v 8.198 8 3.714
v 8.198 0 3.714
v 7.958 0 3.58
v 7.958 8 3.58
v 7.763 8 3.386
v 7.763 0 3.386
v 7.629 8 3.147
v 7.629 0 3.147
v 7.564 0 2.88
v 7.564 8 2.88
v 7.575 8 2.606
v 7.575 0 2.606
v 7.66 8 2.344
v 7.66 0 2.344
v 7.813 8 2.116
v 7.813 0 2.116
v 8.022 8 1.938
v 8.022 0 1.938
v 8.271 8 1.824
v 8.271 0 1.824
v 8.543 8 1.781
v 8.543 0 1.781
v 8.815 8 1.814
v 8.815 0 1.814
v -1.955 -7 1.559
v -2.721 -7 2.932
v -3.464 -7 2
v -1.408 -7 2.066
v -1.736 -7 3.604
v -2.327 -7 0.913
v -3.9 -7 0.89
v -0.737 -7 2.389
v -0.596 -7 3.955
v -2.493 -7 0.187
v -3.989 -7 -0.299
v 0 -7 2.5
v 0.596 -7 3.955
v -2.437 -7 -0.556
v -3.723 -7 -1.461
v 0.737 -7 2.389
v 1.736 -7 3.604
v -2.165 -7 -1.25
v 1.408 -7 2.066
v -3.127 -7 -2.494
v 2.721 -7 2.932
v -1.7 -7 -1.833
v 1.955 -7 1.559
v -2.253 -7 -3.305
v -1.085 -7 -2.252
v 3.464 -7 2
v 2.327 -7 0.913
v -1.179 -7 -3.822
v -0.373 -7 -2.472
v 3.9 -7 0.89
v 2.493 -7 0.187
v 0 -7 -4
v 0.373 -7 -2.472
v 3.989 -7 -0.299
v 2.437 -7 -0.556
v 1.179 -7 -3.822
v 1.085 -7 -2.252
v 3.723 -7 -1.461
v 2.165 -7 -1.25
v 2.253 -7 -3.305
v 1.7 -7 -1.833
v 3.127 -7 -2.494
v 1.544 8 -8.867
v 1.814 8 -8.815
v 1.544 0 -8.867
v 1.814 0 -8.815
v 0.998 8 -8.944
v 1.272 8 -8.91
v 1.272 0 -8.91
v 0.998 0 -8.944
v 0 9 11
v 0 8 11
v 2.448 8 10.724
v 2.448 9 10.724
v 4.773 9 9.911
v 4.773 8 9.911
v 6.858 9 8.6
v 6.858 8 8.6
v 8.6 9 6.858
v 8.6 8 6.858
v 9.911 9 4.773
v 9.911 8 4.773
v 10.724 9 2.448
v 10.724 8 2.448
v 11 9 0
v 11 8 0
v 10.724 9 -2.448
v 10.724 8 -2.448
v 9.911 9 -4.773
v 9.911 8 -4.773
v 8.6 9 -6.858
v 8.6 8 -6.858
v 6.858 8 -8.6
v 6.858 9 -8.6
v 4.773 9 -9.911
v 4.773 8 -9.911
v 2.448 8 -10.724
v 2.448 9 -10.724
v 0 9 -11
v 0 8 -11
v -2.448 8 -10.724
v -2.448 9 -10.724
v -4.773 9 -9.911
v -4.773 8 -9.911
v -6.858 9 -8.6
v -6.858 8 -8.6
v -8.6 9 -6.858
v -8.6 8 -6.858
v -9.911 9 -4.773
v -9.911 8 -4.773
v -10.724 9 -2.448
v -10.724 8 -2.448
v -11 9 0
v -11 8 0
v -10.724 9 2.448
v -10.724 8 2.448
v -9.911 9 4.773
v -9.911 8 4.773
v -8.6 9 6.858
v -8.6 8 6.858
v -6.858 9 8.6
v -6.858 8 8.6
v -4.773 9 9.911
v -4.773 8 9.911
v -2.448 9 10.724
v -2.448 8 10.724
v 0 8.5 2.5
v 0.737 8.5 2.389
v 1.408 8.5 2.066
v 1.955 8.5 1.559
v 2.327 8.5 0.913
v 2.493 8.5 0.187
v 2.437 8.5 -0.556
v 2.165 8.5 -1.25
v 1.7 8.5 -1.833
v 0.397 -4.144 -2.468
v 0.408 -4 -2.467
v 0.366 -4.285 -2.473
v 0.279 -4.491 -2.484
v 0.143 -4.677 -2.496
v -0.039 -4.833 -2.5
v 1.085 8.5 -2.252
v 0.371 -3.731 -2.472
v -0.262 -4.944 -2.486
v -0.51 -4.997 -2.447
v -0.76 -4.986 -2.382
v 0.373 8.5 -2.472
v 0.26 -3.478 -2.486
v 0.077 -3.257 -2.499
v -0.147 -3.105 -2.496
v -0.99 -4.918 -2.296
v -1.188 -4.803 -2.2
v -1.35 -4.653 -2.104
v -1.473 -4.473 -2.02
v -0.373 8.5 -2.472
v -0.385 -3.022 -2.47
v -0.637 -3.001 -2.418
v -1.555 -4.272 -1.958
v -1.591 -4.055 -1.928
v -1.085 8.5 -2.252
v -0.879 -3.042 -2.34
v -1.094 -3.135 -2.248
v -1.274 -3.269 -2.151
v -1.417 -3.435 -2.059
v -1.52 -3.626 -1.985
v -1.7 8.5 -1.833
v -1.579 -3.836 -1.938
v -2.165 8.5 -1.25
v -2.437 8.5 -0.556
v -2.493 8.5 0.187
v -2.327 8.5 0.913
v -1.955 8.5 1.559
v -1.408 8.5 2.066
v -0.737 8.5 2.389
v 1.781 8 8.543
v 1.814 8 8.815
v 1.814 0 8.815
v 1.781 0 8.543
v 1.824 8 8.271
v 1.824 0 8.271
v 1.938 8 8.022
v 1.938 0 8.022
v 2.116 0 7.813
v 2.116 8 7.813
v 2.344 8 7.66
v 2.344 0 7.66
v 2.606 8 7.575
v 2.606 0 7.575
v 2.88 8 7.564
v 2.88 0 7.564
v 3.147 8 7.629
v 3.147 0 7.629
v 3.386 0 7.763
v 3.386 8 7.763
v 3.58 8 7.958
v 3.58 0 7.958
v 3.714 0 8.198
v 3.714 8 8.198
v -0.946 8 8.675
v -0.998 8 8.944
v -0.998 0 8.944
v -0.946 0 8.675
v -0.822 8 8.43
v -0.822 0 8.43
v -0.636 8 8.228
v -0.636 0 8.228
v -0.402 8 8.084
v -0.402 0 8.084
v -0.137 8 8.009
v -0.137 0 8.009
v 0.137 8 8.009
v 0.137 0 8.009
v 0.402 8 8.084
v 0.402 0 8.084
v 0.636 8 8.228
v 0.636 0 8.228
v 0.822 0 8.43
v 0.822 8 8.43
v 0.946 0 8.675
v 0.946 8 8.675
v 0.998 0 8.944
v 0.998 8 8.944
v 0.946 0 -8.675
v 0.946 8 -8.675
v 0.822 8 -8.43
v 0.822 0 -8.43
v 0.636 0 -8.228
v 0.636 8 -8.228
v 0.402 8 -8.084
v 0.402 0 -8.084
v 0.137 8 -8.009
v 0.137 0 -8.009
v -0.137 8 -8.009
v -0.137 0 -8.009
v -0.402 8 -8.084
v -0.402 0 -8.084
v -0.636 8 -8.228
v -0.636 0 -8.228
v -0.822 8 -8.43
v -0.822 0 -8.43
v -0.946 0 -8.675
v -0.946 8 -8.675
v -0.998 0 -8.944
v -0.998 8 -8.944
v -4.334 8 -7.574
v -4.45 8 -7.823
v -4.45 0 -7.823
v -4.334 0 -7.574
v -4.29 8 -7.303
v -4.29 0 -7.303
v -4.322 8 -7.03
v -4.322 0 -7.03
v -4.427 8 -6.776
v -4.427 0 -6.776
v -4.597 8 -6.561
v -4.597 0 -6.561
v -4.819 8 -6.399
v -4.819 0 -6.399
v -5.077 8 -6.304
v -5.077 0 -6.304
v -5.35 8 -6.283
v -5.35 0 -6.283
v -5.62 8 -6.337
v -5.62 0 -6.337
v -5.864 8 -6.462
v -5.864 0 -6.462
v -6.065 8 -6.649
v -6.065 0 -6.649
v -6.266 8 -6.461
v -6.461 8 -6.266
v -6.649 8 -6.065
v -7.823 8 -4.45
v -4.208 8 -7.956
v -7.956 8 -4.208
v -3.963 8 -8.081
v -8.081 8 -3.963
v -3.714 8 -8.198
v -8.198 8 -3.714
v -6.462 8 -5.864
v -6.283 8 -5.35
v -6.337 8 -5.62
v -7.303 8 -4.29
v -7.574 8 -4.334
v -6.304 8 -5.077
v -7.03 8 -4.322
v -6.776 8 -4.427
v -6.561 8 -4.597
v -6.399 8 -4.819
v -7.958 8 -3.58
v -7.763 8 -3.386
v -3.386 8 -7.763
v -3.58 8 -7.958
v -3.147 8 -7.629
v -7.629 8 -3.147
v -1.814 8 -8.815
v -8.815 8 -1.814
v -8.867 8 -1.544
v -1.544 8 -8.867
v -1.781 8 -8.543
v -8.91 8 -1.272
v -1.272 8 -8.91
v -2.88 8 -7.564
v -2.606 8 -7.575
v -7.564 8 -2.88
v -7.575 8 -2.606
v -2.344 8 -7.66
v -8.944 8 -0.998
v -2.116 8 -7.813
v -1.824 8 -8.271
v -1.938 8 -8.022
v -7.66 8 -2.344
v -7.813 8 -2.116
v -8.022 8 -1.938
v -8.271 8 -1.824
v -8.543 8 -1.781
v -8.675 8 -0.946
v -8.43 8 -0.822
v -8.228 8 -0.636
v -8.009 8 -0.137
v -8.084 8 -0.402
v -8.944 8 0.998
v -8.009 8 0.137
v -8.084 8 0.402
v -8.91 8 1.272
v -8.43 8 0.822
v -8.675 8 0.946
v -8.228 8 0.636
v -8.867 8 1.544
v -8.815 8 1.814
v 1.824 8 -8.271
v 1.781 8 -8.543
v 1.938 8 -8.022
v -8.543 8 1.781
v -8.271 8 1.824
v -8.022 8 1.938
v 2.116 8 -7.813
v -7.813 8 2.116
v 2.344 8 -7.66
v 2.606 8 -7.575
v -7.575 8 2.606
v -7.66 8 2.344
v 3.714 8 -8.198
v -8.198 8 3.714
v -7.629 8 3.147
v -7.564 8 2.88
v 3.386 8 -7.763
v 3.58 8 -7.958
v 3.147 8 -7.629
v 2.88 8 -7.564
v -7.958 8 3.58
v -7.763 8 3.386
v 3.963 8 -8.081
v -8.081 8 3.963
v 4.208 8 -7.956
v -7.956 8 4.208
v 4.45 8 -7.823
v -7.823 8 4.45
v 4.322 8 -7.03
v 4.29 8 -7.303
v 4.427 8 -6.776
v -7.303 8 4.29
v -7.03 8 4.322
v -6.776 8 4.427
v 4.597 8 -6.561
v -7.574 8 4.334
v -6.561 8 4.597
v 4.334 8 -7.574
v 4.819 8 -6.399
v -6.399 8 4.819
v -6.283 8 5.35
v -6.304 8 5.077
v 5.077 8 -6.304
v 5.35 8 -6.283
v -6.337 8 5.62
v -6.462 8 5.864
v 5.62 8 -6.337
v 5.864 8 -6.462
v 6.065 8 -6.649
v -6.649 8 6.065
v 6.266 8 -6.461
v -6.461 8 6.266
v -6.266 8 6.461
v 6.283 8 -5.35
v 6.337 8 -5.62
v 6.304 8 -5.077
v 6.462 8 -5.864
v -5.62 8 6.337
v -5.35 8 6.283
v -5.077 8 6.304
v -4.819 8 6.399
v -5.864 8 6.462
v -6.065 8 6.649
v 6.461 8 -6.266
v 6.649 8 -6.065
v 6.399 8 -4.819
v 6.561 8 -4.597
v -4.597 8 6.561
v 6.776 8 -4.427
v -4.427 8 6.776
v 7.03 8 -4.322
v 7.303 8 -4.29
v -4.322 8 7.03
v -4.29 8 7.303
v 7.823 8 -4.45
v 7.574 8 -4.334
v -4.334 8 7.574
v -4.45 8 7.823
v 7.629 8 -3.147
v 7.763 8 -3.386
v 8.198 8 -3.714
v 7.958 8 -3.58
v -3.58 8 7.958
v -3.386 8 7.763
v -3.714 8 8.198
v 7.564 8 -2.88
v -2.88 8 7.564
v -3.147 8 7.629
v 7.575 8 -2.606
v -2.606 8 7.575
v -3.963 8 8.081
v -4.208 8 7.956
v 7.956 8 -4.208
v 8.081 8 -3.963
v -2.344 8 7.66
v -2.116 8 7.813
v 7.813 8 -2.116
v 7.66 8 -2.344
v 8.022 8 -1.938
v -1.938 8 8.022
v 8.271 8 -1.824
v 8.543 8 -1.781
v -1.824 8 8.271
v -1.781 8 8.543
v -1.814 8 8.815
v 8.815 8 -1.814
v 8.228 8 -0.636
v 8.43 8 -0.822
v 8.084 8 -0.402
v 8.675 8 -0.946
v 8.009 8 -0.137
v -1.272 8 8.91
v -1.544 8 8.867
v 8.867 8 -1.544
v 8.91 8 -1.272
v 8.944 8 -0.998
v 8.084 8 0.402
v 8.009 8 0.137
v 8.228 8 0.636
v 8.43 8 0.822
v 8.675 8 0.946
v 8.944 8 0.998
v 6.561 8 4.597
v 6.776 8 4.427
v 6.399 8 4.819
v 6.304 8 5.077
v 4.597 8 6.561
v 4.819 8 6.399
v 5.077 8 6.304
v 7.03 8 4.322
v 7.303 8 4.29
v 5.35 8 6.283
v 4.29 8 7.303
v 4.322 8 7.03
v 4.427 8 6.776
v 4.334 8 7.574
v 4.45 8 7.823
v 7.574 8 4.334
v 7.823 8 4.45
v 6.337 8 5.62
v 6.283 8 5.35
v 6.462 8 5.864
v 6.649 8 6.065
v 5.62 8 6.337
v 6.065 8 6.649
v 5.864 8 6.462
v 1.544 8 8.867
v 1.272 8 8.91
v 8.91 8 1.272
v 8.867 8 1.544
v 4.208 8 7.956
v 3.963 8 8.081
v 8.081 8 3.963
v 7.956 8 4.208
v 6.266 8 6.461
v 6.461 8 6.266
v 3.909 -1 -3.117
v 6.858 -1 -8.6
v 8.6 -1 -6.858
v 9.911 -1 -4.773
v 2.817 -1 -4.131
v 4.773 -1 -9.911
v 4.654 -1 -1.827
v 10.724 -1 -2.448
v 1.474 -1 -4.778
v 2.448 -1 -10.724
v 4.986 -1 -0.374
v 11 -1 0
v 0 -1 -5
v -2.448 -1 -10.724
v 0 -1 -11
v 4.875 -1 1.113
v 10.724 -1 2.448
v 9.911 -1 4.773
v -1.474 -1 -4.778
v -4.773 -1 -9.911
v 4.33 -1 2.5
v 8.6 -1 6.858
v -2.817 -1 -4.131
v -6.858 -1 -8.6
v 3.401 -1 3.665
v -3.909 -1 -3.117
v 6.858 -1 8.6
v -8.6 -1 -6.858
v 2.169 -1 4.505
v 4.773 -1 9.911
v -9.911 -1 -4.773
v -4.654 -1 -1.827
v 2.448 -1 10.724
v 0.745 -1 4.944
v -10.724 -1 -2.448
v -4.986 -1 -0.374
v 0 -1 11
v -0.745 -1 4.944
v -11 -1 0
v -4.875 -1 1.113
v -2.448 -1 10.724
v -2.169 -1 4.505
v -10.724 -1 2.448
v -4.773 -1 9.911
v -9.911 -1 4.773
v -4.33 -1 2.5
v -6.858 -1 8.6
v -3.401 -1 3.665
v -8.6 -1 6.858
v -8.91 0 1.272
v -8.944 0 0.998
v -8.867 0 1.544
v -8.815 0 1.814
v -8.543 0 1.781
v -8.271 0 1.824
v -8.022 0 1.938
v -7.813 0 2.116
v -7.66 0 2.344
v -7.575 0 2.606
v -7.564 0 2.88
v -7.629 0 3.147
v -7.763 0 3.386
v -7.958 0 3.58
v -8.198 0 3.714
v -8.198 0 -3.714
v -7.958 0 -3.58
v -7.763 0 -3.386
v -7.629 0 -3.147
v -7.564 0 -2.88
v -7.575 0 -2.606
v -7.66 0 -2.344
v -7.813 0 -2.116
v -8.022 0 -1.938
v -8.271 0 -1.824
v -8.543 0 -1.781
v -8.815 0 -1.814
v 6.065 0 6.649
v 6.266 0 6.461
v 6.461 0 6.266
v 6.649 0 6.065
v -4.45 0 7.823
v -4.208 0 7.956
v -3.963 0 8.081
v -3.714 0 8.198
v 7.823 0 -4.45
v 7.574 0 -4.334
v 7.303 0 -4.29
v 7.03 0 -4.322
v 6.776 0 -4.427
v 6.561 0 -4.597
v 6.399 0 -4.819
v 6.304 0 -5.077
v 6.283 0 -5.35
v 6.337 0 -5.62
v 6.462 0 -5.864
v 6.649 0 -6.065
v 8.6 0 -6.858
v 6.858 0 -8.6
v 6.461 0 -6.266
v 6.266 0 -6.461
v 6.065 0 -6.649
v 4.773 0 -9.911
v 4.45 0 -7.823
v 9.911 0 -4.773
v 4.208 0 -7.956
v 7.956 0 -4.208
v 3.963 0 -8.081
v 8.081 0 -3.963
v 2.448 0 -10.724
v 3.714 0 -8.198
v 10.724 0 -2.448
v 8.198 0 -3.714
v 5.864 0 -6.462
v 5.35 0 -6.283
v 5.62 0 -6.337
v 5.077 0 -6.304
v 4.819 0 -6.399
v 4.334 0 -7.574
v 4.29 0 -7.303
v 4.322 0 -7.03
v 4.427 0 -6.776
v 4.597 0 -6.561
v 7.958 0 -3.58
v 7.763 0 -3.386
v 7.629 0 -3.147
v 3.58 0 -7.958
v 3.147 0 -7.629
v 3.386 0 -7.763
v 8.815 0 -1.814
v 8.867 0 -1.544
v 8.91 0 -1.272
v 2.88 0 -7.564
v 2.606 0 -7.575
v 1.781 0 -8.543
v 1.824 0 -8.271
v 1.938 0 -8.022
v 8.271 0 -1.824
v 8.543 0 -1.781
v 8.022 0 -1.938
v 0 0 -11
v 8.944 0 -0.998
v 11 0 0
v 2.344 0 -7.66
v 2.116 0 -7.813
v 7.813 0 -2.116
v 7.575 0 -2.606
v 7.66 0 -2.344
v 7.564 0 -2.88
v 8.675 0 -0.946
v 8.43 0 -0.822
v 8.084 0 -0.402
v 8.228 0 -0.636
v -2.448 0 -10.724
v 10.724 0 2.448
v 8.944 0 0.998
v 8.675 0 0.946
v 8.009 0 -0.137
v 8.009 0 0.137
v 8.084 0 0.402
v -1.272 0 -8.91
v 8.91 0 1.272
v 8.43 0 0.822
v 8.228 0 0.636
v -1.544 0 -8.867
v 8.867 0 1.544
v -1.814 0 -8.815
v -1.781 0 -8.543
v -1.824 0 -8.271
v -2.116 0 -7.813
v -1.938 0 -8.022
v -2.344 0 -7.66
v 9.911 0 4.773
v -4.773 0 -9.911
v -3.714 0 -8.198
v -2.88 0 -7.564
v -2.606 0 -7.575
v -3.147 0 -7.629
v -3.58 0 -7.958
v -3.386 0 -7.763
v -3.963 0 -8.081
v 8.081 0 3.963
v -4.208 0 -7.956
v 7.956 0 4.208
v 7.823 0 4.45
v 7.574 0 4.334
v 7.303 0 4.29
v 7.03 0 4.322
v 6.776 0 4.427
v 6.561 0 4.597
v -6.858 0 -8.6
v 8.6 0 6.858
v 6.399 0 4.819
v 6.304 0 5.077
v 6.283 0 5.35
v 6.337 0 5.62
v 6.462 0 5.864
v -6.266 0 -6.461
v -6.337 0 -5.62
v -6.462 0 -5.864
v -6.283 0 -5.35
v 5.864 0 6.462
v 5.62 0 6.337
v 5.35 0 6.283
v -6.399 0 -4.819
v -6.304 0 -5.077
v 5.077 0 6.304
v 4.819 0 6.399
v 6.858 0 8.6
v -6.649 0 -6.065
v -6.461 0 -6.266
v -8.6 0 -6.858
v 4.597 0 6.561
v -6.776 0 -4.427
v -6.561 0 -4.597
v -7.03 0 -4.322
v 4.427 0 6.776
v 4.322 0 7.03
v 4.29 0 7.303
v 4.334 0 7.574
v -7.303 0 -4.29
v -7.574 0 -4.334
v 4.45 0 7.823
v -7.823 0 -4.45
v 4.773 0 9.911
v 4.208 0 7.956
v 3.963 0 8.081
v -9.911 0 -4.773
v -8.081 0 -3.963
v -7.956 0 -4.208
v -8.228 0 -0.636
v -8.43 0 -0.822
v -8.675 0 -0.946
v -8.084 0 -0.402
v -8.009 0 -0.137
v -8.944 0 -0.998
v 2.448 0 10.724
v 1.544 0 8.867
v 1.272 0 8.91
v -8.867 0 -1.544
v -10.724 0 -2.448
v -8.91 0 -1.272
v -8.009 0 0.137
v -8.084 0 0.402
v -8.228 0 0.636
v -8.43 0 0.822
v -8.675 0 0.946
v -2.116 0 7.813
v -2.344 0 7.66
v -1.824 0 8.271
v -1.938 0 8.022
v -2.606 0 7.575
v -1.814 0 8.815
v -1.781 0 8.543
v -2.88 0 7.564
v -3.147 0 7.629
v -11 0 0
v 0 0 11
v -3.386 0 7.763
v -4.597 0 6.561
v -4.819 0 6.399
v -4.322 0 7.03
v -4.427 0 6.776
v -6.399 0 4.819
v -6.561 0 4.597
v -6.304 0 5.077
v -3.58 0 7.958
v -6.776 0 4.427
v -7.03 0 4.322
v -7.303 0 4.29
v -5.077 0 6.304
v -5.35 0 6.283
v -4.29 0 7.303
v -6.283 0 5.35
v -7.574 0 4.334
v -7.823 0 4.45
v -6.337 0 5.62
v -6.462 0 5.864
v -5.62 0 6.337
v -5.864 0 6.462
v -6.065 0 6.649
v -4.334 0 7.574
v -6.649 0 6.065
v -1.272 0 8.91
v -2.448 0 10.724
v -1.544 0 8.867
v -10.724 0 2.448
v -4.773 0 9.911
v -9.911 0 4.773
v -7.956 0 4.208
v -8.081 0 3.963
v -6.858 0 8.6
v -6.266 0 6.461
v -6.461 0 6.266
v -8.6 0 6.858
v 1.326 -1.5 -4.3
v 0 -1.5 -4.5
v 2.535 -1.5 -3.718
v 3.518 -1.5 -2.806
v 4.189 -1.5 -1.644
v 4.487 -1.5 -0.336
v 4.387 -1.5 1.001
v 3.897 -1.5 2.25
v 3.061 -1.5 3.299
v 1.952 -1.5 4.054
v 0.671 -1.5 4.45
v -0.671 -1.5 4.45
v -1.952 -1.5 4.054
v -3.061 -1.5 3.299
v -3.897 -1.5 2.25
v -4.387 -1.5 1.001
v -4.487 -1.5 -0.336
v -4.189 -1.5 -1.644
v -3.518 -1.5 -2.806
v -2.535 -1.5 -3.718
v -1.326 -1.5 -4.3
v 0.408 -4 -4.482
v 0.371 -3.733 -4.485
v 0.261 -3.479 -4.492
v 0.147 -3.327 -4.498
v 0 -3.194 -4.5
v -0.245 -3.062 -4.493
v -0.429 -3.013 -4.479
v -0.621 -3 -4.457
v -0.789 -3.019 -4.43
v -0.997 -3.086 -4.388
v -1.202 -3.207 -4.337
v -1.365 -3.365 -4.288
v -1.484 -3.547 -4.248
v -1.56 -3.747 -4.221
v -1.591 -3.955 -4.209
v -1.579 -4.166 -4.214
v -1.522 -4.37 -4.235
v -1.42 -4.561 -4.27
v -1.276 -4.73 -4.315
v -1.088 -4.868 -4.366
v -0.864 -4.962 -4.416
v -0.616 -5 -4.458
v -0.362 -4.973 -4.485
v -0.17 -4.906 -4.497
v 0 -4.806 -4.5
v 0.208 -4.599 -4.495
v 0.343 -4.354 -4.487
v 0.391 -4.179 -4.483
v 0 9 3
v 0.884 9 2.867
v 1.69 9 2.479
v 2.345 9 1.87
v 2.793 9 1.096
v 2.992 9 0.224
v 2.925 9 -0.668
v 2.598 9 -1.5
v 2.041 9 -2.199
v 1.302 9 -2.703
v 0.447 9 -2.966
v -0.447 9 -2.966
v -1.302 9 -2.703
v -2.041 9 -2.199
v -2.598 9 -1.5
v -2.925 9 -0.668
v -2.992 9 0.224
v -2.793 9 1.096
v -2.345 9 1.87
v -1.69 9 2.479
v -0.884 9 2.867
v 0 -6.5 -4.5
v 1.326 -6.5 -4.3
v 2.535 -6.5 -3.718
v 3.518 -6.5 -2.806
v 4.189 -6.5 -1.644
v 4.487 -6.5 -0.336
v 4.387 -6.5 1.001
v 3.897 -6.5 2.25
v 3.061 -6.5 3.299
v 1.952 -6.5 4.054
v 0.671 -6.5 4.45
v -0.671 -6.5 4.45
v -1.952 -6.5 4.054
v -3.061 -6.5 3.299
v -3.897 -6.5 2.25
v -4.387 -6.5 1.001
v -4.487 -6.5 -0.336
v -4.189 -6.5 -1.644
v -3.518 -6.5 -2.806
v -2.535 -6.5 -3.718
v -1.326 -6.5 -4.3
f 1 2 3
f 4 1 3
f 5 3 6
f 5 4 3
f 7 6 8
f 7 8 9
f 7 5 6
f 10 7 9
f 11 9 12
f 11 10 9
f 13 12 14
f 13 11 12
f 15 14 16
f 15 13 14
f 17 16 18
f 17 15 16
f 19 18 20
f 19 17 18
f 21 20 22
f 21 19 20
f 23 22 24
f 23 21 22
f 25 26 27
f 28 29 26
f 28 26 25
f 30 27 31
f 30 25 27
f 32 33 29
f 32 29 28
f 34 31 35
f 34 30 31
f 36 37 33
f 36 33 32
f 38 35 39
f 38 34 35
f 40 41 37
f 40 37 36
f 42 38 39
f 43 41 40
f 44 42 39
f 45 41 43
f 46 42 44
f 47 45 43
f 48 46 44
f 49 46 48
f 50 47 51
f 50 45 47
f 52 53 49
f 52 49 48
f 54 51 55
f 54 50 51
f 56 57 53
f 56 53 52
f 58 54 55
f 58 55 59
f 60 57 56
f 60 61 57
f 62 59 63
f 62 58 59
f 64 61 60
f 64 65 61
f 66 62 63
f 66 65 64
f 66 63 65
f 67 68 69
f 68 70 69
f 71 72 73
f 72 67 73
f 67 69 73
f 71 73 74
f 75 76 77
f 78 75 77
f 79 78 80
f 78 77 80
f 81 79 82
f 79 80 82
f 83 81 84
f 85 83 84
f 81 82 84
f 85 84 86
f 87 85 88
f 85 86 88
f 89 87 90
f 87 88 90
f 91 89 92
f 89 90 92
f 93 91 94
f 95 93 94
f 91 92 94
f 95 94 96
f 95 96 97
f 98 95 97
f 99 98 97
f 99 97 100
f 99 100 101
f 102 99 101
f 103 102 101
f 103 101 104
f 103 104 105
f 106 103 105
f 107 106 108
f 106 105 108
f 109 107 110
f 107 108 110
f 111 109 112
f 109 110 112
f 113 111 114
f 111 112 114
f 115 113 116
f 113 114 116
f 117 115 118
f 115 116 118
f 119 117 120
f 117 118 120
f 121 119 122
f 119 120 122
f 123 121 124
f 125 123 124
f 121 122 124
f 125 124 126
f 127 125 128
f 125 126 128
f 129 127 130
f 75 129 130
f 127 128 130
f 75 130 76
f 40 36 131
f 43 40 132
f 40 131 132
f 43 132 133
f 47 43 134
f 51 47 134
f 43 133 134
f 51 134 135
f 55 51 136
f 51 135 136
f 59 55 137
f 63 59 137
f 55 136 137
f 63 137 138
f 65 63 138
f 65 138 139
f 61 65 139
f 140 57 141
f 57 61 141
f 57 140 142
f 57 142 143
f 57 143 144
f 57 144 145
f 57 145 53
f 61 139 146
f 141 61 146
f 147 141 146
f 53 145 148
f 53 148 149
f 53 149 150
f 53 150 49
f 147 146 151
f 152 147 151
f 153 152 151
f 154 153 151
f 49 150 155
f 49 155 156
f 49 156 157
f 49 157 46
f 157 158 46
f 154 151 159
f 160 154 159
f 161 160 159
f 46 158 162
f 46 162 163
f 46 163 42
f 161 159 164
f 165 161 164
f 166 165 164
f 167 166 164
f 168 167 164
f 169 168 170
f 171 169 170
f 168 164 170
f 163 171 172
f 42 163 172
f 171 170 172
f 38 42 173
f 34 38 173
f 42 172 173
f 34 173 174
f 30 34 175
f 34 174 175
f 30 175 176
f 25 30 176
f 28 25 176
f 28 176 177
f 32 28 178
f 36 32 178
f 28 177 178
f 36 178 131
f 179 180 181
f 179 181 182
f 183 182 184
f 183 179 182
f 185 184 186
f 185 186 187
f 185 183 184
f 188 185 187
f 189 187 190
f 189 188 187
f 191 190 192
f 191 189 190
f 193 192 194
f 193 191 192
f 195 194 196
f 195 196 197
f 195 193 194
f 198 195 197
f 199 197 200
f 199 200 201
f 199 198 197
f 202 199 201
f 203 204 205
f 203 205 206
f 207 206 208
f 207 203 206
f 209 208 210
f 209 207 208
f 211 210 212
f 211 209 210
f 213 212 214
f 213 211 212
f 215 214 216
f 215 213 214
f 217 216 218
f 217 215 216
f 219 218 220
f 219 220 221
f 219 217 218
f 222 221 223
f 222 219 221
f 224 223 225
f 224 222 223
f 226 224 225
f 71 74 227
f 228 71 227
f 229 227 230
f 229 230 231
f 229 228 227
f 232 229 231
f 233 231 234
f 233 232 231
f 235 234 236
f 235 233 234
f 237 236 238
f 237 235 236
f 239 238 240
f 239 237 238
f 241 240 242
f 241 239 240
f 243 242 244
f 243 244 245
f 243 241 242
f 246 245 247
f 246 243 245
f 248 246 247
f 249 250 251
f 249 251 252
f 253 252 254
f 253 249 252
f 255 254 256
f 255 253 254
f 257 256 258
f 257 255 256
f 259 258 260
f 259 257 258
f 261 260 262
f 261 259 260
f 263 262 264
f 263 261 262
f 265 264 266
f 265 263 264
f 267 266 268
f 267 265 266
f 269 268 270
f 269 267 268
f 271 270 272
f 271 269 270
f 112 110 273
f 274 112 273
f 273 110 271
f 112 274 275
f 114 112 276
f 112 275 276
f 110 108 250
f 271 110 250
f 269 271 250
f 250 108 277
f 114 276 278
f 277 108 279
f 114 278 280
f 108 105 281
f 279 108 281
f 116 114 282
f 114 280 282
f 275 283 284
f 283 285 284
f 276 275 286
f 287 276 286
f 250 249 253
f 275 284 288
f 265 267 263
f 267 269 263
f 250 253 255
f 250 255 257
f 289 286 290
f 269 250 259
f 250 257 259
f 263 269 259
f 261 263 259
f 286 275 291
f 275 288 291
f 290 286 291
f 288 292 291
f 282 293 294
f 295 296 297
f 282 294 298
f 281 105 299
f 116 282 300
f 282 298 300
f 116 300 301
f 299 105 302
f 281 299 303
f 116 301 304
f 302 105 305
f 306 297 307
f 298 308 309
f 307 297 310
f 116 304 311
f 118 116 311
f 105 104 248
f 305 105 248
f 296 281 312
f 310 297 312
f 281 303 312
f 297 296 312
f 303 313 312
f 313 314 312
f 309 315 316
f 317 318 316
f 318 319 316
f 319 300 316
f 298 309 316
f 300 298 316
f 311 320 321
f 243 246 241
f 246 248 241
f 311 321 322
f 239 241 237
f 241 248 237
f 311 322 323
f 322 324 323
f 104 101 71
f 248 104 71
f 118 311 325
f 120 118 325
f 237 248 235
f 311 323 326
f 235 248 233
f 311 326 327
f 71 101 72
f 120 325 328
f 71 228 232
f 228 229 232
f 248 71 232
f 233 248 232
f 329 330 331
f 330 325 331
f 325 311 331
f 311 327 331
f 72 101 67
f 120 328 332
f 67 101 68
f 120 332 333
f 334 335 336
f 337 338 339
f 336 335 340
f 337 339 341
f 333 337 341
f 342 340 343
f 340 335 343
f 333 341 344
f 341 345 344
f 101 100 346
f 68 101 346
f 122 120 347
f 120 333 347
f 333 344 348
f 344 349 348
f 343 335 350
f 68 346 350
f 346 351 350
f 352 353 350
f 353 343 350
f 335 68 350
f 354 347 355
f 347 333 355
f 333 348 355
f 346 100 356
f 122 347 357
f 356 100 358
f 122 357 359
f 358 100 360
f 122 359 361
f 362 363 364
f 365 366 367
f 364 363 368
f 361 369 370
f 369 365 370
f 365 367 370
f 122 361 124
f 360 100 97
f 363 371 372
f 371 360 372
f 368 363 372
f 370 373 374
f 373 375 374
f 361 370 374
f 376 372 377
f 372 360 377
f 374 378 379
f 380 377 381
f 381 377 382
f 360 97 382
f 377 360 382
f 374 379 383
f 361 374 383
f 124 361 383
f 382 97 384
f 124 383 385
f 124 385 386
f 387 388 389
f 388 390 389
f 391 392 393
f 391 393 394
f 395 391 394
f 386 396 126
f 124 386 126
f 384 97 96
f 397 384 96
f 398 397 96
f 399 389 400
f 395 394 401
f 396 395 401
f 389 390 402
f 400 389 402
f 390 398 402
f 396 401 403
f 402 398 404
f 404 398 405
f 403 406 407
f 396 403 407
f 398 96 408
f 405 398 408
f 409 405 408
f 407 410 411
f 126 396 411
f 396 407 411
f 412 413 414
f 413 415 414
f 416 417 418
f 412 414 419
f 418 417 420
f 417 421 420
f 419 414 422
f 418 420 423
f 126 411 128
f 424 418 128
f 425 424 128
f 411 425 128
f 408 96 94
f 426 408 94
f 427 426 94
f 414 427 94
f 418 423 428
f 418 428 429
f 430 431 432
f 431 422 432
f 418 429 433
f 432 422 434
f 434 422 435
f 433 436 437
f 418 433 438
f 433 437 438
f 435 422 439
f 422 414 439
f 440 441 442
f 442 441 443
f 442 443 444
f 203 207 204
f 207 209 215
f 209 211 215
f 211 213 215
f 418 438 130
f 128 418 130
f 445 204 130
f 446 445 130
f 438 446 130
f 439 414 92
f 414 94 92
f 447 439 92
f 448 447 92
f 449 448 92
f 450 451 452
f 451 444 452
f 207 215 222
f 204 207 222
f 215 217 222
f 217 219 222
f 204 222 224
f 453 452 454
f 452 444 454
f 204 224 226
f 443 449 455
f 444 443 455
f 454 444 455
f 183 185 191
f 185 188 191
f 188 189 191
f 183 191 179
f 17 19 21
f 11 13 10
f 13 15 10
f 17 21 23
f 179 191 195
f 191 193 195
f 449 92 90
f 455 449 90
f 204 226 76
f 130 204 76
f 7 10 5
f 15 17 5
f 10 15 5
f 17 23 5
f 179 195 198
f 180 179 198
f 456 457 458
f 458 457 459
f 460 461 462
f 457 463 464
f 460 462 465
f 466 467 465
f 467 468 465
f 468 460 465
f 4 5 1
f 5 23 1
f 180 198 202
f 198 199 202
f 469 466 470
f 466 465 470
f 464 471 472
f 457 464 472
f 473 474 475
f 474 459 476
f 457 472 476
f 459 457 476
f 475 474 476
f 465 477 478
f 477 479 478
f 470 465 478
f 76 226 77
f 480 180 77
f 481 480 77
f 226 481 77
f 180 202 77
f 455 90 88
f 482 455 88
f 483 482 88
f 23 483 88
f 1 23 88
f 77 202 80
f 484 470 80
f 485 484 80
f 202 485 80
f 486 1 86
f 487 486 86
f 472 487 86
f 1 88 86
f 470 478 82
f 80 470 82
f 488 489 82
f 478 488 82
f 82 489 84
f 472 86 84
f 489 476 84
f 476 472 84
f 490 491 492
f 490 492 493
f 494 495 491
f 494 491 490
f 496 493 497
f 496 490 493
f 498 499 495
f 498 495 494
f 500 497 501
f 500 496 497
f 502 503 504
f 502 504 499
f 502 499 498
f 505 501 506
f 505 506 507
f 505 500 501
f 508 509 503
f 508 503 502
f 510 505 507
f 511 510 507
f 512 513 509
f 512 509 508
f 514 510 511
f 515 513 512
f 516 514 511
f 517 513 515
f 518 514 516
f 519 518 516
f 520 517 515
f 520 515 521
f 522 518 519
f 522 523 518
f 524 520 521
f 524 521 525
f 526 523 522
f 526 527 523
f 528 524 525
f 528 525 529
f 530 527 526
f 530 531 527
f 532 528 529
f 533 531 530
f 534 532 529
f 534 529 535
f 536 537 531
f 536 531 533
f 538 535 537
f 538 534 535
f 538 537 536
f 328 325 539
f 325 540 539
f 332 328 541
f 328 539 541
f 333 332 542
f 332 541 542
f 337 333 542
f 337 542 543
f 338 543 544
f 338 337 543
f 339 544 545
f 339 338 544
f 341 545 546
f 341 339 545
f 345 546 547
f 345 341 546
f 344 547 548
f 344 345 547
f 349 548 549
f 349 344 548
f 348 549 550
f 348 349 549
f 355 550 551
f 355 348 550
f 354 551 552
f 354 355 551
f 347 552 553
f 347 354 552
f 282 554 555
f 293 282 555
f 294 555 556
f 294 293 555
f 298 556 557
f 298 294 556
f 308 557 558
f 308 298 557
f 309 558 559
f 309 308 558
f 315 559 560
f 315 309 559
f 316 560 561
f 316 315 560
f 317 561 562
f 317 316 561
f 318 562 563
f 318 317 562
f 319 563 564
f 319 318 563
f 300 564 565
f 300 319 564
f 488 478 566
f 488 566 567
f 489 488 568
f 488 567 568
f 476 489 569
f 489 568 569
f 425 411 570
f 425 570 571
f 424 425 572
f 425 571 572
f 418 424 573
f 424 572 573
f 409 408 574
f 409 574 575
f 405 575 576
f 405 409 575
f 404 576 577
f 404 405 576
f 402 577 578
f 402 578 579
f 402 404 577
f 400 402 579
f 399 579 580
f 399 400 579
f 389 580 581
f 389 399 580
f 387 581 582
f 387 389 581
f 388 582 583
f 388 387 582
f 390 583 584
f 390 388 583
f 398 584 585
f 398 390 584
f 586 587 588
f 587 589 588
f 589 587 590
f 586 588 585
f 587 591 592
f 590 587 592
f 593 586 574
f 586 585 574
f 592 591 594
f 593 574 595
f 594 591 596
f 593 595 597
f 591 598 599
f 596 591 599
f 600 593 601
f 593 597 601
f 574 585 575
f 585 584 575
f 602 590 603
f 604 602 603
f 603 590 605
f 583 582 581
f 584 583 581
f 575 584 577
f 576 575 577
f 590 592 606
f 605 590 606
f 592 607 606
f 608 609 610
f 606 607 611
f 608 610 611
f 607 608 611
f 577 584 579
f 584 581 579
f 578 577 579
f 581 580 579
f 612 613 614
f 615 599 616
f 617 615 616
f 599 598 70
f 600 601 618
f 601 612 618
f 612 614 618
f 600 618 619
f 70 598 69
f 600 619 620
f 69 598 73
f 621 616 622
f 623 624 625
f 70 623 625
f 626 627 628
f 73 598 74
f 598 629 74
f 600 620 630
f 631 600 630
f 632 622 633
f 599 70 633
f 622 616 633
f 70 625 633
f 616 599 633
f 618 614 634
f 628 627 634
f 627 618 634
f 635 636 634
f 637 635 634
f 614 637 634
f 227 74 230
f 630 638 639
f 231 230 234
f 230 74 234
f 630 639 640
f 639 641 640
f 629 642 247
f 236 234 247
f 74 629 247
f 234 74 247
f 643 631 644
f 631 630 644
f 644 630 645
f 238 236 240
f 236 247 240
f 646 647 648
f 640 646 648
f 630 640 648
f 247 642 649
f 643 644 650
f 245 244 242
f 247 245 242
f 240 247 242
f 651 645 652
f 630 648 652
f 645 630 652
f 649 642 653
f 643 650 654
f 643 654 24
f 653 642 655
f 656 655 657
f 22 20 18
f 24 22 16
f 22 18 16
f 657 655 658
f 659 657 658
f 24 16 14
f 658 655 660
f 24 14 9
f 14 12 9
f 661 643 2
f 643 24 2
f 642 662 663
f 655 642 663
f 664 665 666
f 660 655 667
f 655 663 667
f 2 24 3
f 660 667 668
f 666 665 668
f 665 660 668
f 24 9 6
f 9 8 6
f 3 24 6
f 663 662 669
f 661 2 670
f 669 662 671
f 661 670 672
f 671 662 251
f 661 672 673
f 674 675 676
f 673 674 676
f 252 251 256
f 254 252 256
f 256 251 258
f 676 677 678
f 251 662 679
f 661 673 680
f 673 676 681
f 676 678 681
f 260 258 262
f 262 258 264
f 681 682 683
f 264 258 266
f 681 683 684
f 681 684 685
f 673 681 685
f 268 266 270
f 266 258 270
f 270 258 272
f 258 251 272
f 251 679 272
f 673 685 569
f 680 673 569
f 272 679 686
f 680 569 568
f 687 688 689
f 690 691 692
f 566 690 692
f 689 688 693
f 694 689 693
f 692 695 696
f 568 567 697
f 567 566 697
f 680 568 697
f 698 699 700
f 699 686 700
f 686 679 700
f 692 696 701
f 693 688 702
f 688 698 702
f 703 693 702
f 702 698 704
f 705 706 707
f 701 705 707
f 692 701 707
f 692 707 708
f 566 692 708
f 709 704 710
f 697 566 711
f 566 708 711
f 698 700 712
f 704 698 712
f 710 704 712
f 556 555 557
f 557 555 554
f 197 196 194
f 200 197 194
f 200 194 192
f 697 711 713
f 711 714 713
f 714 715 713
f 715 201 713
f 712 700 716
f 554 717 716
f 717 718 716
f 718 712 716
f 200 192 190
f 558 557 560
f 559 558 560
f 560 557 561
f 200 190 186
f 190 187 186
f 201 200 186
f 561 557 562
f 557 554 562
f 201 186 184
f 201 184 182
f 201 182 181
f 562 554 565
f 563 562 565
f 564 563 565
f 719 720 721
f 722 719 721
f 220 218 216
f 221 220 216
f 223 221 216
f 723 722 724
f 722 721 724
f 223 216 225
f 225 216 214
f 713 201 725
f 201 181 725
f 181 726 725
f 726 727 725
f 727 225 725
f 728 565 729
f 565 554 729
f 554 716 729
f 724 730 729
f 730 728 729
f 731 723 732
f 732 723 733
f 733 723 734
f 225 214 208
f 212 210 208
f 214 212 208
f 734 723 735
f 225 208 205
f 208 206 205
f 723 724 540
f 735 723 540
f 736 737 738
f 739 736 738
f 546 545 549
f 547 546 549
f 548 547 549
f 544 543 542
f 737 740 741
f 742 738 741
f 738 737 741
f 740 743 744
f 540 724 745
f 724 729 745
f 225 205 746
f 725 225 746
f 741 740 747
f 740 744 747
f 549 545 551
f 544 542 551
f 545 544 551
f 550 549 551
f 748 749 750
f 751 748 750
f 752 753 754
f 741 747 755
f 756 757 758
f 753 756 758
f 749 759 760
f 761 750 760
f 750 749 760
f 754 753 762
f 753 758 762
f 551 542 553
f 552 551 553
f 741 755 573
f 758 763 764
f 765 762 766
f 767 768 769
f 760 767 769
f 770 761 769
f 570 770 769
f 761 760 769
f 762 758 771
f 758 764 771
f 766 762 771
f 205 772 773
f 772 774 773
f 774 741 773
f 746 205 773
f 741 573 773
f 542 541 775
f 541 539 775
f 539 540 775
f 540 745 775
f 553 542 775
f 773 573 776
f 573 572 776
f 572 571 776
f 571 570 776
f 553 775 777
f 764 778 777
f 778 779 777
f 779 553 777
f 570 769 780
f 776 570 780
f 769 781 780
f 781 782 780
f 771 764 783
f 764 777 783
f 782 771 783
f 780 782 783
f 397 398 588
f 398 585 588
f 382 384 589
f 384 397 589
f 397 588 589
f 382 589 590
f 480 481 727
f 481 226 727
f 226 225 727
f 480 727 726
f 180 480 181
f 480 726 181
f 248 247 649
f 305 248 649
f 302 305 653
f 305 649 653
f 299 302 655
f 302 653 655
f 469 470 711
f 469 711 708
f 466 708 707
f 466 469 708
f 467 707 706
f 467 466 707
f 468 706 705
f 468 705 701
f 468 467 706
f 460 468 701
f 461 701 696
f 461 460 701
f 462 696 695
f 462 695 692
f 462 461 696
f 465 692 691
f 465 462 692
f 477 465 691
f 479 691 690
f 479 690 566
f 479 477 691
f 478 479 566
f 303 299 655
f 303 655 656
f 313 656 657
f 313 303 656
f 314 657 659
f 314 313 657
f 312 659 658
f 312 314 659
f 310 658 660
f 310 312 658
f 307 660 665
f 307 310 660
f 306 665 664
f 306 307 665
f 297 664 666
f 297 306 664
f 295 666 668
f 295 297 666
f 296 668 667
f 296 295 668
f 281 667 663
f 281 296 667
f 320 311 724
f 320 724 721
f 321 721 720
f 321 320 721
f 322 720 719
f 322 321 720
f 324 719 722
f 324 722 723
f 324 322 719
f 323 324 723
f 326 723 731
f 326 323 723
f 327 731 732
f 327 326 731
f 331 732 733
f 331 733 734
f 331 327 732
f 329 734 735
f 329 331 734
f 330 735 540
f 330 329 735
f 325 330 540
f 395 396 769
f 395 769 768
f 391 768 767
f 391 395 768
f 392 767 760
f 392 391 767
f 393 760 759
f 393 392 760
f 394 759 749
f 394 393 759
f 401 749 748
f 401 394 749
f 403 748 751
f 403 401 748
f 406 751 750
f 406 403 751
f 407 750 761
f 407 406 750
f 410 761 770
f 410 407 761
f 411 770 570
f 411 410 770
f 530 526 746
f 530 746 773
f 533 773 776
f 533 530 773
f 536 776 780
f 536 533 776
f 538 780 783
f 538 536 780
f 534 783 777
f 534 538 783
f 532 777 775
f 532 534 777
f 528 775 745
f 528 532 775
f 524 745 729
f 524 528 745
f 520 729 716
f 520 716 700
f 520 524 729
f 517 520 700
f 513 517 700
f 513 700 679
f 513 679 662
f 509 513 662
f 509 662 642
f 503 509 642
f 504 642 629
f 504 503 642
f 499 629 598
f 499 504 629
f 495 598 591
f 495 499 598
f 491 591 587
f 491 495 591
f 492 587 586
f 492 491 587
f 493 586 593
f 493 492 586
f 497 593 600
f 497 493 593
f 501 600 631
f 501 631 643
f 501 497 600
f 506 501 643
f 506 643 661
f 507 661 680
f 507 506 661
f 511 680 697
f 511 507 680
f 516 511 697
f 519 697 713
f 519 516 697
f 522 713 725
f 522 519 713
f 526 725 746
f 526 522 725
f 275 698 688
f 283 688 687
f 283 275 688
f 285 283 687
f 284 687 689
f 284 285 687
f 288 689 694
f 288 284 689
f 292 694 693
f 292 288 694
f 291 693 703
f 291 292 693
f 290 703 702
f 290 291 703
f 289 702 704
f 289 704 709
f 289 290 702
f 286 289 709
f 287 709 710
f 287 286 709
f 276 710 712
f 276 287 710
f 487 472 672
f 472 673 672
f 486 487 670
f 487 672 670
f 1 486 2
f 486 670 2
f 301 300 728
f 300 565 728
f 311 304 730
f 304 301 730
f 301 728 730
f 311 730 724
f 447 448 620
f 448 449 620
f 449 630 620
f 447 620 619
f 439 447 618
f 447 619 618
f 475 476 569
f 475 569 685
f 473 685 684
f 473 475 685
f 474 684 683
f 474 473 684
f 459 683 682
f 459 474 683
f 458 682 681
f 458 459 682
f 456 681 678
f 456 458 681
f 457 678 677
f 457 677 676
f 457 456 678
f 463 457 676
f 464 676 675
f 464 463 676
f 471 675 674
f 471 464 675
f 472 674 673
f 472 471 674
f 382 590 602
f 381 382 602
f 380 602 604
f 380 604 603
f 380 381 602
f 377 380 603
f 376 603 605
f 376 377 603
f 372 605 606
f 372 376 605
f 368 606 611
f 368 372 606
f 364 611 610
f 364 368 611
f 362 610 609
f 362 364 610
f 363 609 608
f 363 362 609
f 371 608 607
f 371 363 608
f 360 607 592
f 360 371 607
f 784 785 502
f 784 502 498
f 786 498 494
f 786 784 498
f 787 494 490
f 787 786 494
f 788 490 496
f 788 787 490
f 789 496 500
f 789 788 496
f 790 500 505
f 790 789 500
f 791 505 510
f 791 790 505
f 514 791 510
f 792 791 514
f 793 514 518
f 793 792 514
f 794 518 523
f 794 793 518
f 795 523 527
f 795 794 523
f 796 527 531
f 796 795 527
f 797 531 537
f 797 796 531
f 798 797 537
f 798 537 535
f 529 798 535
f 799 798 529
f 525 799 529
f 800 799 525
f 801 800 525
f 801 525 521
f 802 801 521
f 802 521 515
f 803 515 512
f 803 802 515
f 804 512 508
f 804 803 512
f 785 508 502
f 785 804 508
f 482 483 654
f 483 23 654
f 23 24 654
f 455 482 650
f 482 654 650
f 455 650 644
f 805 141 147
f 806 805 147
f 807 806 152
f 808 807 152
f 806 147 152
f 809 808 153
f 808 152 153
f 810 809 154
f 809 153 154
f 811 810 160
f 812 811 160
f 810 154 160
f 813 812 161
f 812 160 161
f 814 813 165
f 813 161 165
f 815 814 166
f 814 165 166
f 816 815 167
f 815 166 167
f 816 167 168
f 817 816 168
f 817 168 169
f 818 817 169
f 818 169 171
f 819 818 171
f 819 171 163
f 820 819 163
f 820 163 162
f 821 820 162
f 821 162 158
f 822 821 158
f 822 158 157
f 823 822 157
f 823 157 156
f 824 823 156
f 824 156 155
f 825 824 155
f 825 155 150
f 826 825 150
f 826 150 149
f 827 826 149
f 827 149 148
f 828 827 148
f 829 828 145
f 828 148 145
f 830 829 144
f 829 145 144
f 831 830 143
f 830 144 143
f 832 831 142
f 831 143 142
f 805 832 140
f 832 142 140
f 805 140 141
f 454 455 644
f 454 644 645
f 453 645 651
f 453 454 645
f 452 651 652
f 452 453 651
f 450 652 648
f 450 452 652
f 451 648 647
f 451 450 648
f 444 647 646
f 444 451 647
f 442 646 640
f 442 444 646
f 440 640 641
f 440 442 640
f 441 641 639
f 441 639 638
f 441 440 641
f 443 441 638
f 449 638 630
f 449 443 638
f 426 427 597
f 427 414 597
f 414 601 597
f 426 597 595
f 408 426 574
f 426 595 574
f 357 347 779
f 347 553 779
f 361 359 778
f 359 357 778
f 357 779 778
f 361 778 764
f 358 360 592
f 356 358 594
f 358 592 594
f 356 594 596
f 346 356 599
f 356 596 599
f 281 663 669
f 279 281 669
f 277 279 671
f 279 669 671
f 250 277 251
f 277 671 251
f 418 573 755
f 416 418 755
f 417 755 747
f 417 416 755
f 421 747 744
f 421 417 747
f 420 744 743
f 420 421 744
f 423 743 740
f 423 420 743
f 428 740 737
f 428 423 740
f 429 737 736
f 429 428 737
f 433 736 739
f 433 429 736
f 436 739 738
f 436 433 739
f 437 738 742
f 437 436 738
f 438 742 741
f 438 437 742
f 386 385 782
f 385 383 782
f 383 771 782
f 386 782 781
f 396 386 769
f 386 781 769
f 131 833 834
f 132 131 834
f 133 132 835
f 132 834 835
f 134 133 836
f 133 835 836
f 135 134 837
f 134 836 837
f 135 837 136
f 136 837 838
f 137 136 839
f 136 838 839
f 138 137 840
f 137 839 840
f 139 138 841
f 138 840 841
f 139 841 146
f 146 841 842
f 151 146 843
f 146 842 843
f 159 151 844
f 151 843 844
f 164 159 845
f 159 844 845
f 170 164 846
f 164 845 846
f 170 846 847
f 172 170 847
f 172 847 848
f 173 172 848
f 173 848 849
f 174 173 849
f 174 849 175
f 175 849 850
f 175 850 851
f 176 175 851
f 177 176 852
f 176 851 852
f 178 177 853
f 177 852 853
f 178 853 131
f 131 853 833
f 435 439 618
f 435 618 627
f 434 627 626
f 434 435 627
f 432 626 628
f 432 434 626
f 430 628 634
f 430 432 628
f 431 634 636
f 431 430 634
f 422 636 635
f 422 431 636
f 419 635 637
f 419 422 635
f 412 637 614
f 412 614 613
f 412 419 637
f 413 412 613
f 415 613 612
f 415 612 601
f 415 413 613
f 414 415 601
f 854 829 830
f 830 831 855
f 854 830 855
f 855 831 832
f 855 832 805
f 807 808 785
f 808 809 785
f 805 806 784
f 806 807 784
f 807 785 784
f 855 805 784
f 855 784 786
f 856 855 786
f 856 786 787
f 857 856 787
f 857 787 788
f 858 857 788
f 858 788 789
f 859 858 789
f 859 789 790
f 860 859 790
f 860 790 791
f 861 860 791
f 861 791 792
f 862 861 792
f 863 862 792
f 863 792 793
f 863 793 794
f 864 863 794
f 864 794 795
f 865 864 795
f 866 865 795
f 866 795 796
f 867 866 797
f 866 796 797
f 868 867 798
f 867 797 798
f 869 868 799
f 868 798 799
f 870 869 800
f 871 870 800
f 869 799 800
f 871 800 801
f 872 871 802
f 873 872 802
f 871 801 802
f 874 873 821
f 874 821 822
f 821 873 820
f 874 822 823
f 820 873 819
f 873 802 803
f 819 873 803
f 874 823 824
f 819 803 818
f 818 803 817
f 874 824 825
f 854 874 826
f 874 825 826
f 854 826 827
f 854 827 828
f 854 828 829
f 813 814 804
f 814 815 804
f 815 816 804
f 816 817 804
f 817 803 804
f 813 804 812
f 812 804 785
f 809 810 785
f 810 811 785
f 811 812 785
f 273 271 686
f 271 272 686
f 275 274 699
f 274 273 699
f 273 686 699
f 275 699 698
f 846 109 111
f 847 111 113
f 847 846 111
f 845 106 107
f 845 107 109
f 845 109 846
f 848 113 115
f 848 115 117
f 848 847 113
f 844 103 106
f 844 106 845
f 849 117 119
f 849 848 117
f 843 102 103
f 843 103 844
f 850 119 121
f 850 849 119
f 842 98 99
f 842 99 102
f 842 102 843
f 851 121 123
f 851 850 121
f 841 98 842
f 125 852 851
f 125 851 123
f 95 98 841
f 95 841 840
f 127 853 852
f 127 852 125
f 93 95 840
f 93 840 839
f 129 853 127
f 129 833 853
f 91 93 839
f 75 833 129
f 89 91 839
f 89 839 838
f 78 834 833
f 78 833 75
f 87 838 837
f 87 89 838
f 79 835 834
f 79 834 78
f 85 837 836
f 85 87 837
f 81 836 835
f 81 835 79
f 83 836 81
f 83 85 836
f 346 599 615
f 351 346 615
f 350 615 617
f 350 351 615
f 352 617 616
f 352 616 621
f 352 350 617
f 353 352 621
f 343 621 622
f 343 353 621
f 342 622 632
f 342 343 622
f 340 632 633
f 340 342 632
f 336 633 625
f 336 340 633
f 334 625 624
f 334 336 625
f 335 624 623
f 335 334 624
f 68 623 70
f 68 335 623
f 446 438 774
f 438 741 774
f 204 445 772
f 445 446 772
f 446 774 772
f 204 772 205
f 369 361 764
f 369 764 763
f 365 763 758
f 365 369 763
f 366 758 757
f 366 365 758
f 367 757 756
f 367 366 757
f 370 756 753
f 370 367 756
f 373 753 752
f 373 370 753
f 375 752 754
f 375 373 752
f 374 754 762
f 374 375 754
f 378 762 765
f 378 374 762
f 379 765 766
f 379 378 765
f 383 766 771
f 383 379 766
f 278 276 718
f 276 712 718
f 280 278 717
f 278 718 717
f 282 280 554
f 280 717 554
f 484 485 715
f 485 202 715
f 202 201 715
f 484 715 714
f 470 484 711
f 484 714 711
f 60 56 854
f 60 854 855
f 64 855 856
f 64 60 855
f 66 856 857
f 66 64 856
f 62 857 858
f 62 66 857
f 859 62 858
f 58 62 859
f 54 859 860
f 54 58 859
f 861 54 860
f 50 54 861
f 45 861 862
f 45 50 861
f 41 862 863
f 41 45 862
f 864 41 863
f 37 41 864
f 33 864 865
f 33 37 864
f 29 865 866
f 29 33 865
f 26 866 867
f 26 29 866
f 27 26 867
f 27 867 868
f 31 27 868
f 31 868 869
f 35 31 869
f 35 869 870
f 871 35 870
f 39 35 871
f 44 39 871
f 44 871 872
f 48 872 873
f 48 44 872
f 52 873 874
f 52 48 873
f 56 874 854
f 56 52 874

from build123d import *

# Parameters (mm, degrees)
CROQUIS1_R              = 9
SALIENTE_EXTRUIR1_DEPTH = 8
CROQUIS3_R              = 11
SALIENTE_EXTRUIR2_DEPTH = 1
SALIENTE_EXTRUIR3_START = 1
CROQUIS4_R              = 11
SALIENTE_EXTRUIR3_DEPTH = 1
CROQUIS5_R              = 4.5
SALIENTE_EXTRUIR4_DEPTH = 6
CROQUIS6_R              = 2.5
CORTAR_EXTRUIR1_DEPTH   = 23.315913604
CROQUIS7_R              = 1
CORTAR_EXTRUIR2_DEPTH   = 18.972200756
CROQUIS8_R              = 1
CORTAR_EXTRUIR5_DEPTH   = 8
MATRIZC1_COUNT          = 20
CHAFL_N1_SIZE           = 0.5


with BuildPart() as part:
    # Croquis1 → Saliente-Extruir1 (new body)
    with BuildSketch(Plane(origin=(0, 0, 0), x_dir=(1, 0, 0), z_dir=(0, 1, 0))):
        with Locations(Location((0, 0, 0), (0, 0, 270))):
            Circle(CROQUIS1_R)
    extrude(amount=SALIENTE_EXTRUIR1_DEPTH)

    # Croquis3 → Saliente-Extruir2 (add)
    with BuildSketch(Plane(origin=(0, 8, 0), x_dir=(1, 0, 0), z_dir=(0, 1, 0))):
        with Locations(Location((0, 0, 0), (0, 0, 270))):
            Circle(CROQUIS3_R)
    extrude(amount=SALIENTE_EXTRUIR2_DEPTH)

    # Croquis4 → Saliente-Extruir3 (add)
    with BuildSketch(Plane.XZ.offset(SALIENTE_EXTRUIR3_START)):
        with Locations(Location((0, 0, 0), (0, 0, 90))):
            Circle(CROQUIS4_R)
    extrude(amount=-SALIENTE_EXTRUIR3_DEPTH)

    # Croquis5 → Saliente-Extruir4 (add)
    with BuildSketch(Plane.XZ.offset(1)):
        with Locations(Location((0, 0, 0), (0, 0, 270))):
            Circle(CROQUIS5_R)
    extrude(amount=SALIENTE_EXTRUIR4_DEPTH)

    # Croquis6 → Cortar-Extruir1 (cut, through all)
    with BuildSketch(Plane(origin=(0, 9, 0), x_dir=(1, 0, 0), z_dir=(0, 1, 0))):
        with Locations(Location((0, 0, 0), (0, 0, 270))):
            Circle(CROQUIS6_R)
    extrude(amount=-CORTAR_EXTRUIR1_DEPTH, mode=Mode.SUBTRACT)

    # Croquis7 → Cortar-Extruir2 (cut, through all)
    with BuildSketch(Plane.XY):
        with Locations((-0.592473365, -4)):
            Circle(CROQUIS7_R)
    extrude(amount=-CORTAR_EXTRUIR2_DEPTH, mode=Mode.SUBTRACT)

    # Croquis8 → Cortar-Extruir5 (cut)
    with BuildSketch(Plane.XZ.offset(-8)):
        with Locations((0, -9)):
            Circle(CROQUIS8_R)
    cortar_extruir5 = extrude(amount=CORTAR_EXTRUIR5_DEPTH, mode=Mode.SUBTRACT)

    # MatrizC1: Cortar-Extruir5 ×20 about axis
    matrizc1_axis = Axis((0, 0, 0), (0, 1, 0))
    for i in range(1, MATRIZC1_COUNT):
        add(cortar_extruir5.rotate(matrizc1_axis, i * 360 / MATRIZC1_COUNT), mode=Mode.SUBTRACT)

    # Chaflán1
    chafl_n1_edges = [part.edges().sort_by_distance(p)[0] for p in [
        (0, -1, 4.5),
        (0, -7, 4.5),
        (0, 9, -2.5),
    ]]
    chamfer(chafl_n1_edges, length=CHAFL_N1_SIZE)


solid = part.part
